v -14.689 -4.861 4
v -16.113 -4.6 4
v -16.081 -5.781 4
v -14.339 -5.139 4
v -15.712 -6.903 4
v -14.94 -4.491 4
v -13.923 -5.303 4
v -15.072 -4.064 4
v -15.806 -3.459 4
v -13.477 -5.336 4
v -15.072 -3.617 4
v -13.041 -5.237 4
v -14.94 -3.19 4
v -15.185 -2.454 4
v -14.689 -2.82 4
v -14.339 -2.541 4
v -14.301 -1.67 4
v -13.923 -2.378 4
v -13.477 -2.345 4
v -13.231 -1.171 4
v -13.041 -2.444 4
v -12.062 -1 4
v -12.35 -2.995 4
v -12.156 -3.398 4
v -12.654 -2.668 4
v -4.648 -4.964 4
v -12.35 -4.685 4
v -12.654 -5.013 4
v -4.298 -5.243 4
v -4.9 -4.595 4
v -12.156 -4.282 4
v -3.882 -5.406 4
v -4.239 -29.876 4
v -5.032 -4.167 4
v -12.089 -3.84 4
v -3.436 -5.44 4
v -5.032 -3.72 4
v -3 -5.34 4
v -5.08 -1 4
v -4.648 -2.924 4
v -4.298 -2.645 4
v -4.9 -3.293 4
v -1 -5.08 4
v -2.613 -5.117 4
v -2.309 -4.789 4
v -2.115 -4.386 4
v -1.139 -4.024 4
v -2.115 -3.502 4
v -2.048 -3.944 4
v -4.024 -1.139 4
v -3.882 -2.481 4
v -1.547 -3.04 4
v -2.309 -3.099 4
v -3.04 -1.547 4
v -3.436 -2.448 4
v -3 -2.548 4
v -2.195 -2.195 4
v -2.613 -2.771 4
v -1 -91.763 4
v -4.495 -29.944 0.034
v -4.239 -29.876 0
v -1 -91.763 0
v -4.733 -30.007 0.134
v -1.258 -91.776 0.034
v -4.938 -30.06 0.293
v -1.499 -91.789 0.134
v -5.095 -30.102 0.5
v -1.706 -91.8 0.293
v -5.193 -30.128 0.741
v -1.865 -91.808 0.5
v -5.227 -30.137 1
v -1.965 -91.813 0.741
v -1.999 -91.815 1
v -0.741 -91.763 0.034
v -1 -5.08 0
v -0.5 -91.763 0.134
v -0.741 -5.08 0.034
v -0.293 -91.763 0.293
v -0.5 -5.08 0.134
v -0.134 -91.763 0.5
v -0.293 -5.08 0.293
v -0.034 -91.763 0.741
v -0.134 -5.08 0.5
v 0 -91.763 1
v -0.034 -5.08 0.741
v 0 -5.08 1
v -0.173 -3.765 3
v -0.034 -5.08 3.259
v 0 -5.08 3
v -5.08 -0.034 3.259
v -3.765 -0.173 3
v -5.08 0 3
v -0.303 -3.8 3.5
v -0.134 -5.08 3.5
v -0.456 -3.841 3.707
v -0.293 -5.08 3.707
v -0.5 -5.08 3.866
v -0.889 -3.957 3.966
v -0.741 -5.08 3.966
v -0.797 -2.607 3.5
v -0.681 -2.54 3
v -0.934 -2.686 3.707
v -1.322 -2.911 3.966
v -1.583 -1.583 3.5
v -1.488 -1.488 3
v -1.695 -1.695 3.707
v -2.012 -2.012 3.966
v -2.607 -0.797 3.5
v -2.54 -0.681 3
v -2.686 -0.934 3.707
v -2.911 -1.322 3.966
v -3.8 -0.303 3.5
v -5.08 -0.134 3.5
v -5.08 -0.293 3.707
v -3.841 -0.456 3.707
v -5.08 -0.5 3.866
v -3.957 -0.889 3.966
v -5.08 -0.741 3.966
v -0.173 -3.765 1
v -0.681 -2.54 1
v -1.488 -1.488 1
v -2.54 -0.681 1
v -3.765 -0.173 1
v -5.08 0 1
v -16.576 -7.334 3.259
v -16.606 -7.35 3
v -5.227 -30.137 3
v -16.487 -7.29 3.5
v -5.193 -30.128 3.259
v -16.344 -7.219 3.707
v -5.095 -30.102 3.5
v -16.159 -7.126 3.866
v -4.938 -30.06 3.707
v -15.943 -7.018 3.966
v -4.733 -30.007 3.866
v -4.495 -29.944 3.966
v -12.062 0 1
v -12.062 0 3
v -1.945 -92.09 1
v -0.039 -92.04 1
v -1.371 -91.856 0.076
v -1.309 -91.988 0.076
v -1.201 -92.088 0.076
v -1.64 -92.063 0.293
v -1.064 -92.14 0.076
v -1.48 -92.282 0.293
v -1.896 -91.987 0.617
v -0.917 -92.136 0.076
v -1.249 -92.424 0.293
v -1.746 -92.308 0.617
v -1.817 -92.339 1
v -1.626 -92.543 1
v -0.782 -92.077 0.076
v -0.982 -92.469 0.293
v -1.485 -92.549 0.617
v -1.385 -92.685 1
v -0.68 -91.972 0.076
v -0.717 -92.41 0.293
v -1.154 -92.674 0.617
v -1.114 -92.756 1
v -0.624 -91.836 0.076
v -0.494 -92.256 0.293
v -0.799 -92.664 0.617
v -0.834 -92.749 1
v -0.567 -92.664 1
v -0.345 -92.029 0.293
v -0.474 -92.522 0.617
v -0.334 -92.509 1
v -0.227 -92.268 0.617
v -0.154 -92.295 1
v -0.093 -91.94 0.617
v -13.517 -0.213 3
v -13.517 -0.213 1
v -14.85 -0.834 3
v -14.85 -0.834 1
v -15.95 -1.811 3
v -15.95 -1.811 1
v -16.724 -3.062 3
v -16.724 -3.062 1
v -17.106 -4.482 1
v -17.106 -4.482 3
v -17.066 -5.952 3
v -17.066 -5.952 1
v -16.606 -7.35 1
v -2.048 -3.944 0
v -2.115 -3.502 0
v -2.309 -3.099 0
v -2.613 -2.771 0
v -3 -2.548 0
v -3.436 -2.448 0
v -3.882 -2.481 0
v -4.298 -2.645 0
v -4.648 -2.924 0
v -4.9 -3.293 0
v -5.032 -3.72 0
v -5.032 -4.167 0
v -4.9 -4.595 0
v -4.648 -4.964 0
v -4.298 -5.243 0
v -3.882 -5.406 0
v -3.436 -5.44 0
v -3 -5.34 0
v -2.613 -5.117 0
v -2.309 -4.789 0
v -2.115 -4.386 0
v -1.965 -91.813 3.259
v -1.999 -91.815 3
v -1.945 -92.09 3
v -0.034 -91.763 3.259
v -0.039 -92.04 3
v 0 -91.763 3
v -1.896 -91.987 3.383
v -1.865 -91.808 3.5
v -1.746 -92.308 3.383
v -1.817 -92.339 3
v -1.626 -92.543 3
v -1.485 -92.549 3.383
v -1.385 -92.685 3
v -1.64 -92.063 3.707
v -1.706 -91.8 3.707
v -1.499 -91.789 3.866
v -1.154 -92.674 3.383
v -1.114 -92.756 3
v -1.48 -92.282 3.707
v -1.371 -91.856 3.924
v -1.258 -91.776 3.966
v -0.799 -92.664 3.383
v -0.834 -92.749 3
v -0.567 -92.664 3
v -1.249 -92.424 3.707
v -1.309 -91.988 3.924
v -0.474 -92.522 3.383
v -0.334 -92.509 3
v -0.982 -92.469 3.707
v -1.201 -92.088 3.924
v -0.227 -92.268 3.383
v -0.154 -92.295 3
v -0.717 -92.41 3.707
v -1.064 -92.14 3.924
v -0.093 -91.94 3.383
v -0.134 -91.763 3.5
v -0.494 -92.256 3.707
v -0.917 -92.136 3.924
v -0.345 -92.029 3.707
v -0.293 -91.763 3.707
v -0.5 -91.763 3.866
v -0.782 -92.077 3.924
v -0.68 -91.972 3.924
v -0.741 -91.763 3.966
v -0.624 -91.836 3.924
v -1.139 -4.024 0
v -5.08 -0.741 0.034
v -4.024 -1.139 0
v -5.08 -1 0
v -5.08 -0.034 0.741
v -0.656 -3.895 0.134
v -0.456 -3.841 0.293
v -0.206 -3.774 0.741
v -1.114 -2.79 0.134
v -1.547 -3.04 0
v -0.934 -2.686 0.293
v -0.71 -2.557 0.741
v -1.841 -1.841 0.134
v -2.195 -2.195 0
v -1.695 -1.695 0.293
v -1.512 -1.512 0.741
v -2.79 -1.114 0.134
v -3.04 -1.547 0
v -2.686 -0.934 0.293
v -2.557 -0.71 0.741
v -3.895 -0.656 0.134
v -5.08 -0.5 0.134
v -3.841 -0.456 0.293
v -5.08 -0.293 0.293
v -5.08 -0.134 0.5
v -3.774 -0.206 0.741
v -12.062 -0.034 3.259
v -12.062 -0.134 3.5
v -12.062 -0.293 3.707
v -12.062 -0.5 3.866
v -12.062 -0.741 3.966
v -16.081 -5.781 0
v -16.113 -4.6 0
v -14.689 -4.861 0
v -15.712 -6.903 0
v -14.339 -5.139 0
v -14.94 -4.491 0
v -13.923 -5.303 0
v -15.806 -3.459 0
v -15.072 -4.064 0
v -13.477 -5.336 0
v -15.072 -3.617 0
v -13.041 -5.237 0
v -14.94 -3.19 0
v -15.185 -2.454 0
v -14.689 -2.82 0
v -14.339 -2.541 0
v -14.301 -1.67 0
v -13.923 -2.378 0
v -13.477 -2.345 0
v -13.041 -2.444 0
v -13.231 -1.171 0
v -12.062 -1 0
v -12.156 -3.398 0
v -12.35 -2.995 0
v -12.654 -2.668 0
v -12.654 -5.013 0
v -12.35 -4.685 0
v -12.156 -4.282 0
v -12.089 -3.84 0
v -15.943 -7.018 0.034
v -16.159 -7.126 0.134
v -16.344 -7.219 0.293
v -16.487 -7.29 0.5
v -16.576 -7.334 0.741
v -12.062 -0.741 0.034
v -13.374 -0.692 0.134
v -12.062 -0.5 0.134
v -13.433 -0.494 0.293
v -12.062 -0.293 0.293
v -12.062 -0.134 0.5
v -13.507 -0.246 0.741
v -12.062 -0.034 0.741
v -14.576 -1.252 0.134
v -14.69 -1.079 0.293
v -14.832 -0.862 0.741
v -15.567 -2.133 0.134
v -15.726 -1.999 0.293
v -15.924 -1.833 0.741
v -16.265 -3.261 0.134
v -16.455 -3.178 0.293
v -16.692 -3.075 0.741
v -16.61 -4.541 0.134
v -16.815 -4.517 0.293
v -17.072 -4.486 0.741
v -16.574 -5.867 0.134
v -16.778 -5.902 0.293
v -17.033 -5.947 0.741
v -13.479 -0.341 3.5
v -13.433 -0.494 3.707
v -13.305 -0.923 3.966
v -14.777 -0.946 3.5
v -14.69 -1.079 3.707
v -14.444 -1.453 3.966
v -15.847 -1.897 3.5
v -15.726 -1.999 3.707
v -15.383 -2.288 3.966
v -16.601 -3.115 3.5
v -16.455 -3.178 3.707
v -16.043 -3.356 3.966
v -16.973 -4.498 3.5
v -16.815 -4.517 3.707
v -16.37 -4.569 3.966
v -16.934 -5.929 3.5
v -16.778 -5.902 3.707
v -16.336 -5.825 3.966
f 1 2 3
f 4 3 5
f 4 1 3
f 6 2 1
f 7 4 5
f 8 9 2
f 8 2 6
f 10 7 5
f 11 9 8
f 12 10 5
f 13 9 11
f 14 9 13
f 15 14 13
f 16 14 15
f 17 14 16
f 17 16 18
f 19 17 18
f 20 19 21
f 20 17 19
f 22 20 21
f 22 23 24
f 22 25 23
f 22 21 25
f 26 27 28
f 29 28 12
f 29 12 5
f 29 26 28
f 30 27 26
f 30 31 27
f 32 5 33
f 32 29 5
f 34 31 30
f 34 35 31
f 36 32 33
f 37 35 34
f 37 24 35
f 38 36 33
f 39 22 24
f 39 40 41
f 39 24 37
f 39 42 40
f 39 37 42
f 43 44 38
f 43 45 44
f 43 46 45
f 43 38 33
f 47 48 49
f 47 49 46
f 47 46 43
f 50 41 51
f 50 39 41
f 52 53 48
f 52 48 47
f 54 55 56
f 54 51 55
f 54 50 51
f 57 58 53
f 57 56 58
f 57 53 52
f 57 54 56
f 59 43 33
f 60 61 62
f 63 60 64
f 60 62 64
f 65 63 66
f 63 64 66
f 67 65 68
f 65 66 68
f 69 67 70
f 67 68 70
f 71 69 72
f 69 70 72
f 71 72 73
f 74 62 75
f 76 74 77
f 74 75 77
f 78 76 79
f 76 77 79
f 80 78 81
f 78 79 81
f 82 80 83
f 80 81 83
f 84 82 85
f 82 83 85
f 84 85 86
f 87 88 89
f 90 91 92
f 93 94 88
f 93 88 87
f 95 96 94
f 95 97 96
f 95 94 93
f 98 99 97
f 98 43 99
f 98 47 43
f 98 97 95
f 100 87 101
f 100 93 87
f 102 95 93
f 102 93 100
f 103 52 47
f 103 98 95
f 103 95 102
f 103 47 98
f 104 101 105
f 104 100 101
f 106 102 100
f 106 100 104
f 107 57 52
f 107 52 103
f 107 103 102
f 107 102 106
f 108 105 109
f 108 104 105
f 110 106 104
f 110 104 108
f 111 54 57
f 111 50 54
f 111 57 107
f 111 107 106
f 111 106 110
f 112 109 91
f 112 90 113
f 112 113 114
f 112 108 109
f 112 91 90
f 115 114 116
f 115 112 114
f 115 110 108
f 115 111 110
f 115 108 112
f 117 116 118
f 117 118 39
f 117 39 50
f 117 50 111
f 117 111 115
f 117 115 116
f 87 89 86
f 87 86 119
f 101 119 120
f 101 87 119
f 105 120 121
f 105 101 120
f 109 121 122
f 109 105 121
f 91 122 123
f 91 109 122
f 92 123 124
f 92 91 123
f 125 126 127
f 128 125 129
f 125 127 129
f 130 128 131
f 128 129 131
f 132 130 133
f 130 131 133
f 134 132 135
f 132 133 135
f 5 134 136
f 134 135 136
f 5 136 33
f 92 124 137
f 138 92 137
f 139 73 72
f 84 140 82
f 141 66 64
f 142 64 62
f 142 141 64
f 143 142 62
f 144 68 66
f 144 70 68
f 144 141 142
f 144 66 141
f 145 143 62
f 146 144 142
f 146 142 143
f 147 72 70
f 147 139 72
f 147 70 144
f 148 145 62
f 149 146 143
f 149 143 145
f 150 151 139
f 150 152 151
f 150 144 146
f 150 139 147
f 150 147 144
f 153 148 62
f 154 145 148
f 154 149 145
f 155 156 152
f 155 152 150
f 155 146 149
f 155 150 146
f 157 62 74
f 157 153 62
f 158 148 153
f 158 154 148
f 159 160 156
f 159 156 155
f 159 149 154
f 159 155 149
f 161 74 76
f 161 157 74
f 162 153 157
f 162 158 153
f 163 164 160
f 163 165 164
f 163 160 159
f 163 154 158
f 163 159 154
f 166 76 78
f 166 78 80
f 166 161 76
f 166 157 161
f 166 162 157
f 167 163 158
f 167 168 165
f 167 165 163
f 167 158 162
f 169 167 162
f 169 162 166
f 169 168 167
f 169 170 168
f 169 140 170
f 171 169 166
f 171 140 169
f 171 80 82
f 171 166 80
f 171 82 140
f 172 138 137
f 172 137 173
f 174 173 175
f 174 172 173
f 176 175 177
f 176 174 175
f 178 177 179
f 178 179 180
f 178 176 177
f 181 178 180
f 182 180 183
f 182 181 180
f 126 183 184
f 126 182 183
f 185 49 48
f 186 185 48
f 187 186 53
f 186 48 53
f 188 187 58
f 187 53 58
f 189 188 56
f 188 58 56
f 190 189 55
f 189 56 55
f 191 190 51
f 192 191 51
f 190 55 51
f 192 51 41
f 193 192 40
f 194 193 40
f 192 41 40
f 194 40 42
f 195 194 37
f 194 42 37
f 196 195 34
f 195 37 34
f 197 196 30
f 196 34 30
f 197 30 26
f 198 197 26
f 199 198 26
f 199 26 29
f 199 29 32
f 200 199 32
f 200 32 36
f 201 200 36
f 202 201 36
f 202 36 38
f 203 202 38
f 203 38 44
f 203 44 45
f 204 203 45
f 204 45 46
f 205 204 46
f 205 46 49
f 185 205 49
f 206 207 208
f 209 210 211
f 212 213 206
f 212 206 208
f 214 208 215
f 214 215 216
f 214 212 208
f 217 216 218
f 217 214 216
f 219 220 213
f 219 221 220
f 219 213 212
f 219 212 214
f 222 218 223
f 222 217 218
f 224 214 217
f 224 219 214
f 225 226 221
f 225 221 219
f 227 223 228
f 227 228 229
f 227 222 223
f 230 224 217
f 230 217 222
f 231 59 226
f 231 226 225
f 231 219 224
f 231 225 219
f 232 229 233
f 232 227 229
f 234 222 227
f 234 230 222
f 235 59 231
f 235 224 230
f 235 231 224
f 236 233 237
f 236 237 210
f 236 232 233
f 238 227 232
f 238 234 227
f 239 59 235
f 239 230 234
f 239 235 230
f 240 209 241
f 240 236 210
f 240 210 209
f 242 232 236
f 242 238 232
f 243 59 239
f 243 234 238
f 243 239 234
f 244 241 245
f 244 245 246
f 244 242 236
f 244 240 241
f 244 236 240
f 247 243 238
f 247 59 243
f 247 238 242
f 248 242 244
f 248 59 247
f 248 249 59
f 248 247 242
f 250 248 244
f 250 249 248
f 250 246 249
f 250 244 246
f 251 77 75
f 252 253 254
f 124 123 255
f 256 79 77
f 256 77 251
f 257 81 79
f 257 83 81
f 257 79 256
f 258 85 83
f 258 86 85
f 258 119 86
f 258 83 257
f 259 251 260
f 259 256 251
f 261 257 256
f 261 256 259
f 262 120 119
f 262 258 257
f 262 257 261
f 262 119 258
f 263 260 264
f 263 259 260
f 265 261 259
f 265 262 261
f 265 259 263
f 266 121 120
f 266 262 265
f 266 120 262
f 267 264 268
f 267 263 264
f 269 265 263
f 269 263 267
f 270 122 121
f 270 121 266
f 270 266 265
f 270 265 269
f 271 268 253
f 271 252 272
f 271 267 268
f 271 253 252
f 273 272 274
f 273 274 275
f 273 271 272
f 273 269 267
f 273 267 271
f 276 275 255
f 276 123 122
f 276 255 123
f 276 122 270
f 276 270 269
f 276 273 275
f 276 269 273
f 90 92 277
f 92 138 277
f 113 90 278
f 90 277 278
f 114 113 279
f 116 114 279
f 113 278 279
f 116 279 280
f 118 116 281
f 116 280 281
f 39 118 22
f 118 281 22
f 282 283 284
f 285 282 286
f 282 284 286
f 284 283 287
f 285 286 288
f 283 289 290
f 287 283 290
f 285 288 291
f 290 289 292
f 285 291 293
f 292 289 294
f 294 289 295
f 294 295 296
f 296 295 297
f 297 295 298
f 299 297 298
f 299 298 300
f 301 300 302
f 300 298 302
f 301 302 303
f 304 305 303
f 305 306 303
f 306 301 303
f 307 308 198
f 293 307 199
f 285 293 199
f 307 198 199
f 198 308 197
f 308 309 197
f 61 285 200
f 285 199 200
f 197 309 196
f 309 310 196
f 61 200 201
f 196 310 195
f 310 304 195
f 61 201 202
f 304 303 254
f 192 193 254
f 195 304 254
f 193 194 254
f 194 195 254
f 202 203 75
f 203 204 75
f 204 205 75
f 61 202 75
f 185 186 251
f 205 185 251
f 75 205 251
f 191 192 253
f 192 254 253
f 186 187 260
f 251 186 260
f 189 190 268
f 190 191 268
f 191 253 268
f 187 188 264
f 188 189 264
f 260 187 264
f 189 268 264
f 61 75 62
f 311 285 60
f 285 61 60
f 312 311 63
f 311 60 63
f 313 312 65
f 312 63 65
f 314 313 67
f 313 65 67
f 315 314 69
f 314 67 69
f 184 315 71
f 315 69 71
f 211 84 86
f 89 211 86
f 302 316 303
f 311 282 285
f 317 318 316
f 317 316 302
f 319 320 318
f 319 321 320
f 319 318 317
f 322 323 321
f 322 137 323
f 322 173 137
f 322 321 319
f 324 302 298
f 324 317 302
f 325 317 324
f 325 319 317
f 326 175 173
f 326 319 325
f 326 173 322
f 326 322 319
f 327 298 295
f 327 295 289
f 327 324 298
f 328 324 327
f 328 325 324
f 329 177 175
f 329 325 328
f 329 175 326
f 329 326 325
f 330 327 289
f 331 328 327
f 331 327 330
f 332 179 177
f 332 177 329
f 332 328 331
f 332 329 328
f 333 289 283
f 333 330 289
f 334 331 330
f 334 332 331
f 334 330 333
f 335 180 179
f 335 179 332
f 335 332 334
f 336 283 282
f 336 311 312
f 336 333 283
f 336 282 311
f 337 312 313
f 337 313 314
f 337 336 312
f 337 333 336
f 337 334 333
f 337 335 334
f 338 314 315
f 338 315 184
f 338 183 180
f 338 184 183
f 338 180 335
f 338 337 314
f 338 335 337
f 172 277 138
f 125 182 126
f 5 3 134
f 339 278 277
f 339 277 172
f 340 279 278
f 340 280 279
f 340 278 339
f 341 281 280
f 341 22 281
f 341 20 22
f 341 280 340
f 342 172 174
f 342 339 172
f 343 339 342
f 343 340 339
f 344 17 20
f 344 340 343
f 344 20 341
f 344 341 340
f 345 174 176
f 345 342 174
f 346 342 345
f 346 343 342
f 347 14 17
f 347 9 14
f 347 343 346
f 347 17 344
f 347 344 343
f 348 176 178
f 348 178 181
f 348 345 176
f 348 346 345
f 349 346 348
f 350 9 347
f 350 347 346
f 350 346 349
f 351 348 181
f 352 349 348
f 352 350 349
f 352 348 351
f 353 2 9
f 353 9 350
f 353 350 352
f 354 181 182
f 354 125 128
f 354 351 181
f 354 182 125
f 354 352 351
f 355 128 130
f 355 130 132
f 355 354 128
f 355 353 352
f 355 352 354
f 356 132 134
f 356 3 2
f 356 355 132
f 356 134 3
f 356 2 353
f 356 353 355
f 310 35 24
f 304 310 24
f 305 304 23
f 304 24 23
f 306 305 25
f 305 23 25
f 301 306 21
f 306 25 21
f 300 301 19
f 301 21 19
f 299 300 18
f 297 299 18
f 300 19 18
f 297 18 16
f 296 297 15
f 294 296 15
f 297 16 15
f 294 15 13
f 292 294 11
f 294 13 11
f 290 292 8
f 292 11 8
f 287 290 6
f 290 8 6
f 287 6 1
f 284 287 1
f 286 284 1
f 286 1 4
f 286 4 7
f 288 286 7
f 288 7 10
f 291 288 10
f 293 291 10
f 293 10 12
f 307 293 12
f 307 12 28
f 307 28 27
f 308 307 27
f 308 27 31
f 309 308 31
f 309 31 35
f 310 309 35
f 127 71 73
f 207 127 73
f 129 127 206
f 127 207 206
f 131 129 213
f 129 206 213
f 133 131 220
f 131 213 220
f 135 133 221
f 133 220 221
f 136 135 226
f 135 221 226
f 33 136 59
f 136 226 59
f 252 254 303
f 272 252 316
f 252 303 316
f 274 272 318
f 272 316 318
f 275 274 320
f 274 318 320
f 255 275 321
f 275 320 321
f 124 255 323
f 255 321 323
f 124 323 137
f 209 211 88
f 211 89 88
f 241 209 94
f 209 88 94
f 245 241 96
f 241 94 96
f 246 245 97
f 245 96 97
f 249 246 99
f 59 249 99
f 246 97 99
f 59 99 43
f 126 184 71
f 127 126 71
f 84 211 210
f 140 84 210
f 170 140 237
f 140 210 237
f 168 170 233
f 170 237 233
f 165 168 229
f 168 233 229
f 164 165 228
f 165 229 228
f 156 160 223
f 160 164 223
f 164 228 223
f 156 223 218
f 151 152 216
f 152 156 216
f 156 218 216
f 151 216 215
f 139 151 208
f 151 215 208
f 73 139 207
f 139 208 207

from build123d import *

# Parameters (mm, degrees)
F1_DEPTH = 4
F2_R     = 5.08
F3_R     = 5.08
F4_R     = 1
F5_R     = 1
F6_R     = 1.5
F7_DEPTH = 25.4
F8_R     = 1


# Not quite as in the source:
# - a feature names something its author has since deleted; it is built from what else it names


with BuildPart() as f1:
    # F0 (on Top) → F1 (new body)
    with BuildSketch(Plane.XY):
        Polygon((0, -130), (0, 0), (-20.2767271549, 0), (-5.2268992042, -30.1366958052), align=None)
    extrude(amount=F1_DEPTH)

    # F2
    f2_edges = [f1.edges().sort_by_distance(p)[0] for p in [
        (0, 0, 2),
    ]]
    fillet(f2_edges, radius=F2_R)

    # F3
    f3_edges = [f1.edges().sort_by_distance(p)[0] for p in [
        (-20.276727, 0, 2),
    ]]
    fillet(f3_edges, radius=F3_R)

    # F4
    f4_edges = [f1.edges().sort_by_distance(p)[0] for p in [
        (0, -130, 2),
    ]]
    fillet(f4_edges, radius=F4_R)

    # F5
    f5_edges = [f1.edges().sort_by_distance(p)[0] for p in [
        (-10.916669, -18.743153, 4),
        (-3.612766, -60.975757, 4),
    ]]
    fillet(f5_edges, radius=F5_R)

    # F6 (on face) → F7 (cut)
    with BuildSketch(Plane.XY.offset(4)):
        with Locations((-13.589, -3.840335412)):
            Circle(F6_R)
        with Locations((-3.5482854582, -3.9438293315)):
            Circle(F6_R)
    extrude(amount=-F7_DEPTH, mode=Mode.SUBTRACT)

    # F8
    f8_edges = [f1.edges().sort_by_distance(p)[0] for p in [
        (-8.570816, 0, 0),
        (-10.916669, -18.743153, 0),
    ]]
    fillet(f8_edges, radius=F8_R)


solid = f1.part
